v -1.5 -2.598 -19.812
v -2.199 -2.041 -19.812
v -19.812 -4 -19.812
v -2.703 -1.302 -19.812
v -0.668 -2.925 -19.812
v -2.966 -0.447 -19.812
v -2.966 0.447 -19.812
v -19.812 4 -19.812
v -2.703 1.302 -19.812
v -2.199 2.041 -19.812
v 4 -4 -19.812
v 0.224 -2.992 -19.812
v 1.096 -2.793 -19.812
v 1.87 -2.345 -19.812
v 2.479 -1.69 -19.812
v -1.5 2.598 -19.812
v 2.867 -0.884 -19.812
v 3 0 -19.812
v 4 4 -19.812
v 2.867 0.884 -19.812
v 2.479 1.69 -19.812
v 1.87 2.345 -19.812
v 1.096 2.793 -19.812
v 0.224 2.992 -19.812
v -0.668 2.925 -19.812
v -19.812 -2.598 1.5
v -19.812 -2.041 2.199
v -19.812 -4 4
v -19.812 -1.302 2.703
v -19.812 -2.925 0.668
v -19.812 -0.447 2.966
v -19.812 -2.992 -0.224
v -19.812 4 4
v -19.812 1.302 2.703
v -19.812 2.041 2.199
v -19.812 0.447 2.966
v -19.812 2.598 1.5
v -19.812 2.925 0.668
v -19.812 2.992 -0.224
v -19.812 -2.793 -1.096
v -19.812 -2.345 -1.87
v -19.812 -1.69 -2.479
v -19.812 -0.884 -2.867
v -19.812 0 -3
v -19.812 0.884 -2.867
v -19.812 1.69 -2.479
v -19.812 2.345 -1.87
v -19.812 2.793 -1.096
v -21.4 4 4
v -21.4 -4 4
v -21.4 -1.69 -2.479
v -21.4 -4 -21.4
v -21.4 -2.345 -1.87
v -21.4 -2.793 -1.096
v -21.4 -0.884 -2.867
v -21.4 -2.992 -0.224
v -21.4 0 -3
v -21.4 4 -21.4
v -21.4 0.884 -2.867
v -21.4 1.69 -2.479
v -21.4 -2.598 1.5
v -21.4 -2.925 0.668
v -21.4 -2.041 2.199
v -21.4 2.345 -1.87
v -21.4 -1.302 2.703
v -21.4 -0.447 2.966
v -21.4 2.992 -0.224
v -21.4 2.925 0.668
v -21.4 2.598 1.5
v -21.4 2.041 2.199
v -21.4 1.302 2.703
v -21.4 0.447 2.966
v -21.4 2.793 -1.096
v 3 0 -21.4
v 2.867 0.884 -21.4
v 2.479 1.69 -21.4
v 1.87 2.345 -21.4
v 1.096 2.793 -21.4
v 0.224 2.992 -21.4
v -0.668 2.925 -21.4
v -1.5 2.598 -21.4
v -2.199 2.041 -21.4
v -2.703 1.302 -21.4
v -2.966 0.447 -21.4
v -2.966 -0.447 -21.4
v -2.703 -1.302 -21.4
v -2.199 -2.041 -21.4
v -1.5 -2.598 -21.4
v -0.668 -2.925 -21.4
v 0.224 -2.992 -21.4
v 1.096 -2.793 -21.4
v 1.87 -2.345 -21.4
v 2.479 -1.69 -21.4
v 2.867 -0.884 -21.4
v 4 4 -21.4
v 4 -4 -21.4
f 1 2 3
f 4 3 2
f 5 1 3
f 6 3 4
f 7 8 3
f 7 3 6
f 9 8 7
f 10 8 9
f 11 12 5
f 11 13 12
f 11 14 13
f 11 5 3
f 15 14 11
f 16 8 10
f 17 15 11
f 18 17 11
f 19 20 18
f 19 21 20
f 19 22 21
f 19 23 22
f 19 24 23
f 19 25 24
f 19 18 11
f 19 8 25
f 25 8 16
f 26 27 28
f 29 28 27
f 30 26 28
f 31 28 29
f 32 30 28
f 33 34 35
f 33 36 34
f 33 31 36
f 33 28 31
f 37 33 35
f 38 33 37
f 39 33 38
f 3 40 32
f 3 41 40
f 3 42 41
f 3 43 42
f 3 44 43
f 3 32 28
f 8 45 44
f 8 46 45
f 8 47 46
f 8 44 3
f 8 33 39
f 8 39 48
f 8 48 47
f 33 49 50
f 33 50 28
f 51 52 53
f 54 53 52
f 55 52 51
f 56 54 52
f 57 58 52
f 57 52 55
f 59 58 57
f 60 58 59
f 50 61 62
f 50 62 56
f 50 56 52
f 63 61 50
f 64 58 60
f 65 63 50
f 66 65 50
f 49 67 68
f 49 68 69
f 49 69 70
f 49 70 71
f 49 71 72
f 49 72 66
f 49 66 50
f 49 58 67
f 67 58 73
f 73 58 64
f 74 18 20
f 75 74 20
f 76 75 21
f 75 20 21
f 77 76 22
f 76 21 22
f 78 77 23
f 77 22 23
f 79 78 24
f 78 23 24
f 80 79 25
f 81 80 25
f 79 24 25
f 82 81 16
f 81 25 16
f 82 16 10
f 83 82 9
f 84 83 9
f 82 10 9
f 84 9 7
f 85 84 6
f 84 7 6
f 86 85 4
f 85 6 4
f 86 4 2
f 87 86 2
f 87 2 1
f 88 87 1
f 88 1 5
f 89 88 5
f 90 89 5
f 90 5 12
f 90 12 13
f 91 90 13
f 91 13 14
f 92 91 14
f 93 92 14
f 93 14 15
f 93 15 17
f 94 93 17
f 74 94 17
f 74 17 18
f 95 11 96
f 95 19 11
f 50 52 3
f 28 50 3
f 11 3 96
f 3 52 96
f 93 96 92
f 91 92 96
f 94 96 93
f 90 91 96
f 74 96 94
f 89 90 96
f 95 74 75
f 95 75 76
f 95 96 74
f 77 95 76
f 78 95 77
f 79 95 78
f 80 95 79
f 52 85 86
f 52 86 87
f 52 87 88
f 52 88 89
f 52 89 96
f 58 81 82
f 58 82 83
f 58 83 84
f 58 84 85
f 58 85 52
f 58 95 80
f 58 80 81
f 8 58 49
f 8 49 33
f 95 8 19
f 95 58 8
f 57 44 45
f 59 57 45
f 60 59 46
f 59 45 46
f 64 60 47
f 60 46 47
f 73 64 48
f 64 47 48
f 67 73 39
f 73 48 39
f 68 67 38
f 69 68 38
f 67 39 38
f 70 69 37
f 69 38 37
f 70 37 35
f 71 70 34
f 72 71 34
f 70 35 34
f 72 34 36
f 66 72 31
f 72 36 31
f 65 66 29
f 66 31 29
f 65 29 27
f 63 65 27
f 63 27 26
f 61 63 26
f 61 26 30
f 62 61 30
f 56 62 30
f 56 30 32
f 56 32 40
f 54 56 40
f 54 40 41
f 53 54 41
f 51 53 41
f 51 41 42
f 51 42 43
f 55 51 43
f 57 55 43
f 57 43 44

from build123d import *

# Parameters (mm, degrees)
BOSS_EXTRUDE1_DEPTH = 4
SKETCH2_R           = 3
CUT_EXTRUDE1_DEPTH  = 33.264456547
SKETCH3_R           = 3
CUT_EXTRUDE2_DEPTH  = 33.264456547


with BuildPart() as part:
    # Sketch1 → Boss-Extrude1 (new, symmetric)
    with BuildSketch(Plane(origin=(0, 0, 0), x_dir=(1, 0, 0), z_dir=(0, 1, 0))):
        Polygon((-4, 19.8125), (4, 19.8125), (4, 21.4), (-4, 21.4), (-21.4, 21.4), (-21.4, 4), (-21.4, -4), (-19.8125, -4), (-19.8125, 4), (-19.8125, 19.8125), align=None)
    extrude(amount=BOSS_EXTRUDE1_DEPTH, both=True)

    # Sketch2 → Cut-Extrude1 (cut, through all)
    with BuildSketch(Plane(origin=(-19.8125, 0, 0), x_dir=(0, 0, -1), z_dir=(1, 0, 0))):
        Circle(SKETCH2_R)
    extrude(amount=-CUT_EXTRUDE1_DEPTH, mode=Mode.SUBTRACT)

    # Sketch3 → Cut-Extrude2 (cut, through all)
    with BuildSketch(Plane.XY.offset(-19.8125)):
        Circle(SKETCH3_R)
    extrude(amount=-CUT_EXTRUDE2_DEPTH, mode=Mode.SUBTRACT)


solid = part.part
